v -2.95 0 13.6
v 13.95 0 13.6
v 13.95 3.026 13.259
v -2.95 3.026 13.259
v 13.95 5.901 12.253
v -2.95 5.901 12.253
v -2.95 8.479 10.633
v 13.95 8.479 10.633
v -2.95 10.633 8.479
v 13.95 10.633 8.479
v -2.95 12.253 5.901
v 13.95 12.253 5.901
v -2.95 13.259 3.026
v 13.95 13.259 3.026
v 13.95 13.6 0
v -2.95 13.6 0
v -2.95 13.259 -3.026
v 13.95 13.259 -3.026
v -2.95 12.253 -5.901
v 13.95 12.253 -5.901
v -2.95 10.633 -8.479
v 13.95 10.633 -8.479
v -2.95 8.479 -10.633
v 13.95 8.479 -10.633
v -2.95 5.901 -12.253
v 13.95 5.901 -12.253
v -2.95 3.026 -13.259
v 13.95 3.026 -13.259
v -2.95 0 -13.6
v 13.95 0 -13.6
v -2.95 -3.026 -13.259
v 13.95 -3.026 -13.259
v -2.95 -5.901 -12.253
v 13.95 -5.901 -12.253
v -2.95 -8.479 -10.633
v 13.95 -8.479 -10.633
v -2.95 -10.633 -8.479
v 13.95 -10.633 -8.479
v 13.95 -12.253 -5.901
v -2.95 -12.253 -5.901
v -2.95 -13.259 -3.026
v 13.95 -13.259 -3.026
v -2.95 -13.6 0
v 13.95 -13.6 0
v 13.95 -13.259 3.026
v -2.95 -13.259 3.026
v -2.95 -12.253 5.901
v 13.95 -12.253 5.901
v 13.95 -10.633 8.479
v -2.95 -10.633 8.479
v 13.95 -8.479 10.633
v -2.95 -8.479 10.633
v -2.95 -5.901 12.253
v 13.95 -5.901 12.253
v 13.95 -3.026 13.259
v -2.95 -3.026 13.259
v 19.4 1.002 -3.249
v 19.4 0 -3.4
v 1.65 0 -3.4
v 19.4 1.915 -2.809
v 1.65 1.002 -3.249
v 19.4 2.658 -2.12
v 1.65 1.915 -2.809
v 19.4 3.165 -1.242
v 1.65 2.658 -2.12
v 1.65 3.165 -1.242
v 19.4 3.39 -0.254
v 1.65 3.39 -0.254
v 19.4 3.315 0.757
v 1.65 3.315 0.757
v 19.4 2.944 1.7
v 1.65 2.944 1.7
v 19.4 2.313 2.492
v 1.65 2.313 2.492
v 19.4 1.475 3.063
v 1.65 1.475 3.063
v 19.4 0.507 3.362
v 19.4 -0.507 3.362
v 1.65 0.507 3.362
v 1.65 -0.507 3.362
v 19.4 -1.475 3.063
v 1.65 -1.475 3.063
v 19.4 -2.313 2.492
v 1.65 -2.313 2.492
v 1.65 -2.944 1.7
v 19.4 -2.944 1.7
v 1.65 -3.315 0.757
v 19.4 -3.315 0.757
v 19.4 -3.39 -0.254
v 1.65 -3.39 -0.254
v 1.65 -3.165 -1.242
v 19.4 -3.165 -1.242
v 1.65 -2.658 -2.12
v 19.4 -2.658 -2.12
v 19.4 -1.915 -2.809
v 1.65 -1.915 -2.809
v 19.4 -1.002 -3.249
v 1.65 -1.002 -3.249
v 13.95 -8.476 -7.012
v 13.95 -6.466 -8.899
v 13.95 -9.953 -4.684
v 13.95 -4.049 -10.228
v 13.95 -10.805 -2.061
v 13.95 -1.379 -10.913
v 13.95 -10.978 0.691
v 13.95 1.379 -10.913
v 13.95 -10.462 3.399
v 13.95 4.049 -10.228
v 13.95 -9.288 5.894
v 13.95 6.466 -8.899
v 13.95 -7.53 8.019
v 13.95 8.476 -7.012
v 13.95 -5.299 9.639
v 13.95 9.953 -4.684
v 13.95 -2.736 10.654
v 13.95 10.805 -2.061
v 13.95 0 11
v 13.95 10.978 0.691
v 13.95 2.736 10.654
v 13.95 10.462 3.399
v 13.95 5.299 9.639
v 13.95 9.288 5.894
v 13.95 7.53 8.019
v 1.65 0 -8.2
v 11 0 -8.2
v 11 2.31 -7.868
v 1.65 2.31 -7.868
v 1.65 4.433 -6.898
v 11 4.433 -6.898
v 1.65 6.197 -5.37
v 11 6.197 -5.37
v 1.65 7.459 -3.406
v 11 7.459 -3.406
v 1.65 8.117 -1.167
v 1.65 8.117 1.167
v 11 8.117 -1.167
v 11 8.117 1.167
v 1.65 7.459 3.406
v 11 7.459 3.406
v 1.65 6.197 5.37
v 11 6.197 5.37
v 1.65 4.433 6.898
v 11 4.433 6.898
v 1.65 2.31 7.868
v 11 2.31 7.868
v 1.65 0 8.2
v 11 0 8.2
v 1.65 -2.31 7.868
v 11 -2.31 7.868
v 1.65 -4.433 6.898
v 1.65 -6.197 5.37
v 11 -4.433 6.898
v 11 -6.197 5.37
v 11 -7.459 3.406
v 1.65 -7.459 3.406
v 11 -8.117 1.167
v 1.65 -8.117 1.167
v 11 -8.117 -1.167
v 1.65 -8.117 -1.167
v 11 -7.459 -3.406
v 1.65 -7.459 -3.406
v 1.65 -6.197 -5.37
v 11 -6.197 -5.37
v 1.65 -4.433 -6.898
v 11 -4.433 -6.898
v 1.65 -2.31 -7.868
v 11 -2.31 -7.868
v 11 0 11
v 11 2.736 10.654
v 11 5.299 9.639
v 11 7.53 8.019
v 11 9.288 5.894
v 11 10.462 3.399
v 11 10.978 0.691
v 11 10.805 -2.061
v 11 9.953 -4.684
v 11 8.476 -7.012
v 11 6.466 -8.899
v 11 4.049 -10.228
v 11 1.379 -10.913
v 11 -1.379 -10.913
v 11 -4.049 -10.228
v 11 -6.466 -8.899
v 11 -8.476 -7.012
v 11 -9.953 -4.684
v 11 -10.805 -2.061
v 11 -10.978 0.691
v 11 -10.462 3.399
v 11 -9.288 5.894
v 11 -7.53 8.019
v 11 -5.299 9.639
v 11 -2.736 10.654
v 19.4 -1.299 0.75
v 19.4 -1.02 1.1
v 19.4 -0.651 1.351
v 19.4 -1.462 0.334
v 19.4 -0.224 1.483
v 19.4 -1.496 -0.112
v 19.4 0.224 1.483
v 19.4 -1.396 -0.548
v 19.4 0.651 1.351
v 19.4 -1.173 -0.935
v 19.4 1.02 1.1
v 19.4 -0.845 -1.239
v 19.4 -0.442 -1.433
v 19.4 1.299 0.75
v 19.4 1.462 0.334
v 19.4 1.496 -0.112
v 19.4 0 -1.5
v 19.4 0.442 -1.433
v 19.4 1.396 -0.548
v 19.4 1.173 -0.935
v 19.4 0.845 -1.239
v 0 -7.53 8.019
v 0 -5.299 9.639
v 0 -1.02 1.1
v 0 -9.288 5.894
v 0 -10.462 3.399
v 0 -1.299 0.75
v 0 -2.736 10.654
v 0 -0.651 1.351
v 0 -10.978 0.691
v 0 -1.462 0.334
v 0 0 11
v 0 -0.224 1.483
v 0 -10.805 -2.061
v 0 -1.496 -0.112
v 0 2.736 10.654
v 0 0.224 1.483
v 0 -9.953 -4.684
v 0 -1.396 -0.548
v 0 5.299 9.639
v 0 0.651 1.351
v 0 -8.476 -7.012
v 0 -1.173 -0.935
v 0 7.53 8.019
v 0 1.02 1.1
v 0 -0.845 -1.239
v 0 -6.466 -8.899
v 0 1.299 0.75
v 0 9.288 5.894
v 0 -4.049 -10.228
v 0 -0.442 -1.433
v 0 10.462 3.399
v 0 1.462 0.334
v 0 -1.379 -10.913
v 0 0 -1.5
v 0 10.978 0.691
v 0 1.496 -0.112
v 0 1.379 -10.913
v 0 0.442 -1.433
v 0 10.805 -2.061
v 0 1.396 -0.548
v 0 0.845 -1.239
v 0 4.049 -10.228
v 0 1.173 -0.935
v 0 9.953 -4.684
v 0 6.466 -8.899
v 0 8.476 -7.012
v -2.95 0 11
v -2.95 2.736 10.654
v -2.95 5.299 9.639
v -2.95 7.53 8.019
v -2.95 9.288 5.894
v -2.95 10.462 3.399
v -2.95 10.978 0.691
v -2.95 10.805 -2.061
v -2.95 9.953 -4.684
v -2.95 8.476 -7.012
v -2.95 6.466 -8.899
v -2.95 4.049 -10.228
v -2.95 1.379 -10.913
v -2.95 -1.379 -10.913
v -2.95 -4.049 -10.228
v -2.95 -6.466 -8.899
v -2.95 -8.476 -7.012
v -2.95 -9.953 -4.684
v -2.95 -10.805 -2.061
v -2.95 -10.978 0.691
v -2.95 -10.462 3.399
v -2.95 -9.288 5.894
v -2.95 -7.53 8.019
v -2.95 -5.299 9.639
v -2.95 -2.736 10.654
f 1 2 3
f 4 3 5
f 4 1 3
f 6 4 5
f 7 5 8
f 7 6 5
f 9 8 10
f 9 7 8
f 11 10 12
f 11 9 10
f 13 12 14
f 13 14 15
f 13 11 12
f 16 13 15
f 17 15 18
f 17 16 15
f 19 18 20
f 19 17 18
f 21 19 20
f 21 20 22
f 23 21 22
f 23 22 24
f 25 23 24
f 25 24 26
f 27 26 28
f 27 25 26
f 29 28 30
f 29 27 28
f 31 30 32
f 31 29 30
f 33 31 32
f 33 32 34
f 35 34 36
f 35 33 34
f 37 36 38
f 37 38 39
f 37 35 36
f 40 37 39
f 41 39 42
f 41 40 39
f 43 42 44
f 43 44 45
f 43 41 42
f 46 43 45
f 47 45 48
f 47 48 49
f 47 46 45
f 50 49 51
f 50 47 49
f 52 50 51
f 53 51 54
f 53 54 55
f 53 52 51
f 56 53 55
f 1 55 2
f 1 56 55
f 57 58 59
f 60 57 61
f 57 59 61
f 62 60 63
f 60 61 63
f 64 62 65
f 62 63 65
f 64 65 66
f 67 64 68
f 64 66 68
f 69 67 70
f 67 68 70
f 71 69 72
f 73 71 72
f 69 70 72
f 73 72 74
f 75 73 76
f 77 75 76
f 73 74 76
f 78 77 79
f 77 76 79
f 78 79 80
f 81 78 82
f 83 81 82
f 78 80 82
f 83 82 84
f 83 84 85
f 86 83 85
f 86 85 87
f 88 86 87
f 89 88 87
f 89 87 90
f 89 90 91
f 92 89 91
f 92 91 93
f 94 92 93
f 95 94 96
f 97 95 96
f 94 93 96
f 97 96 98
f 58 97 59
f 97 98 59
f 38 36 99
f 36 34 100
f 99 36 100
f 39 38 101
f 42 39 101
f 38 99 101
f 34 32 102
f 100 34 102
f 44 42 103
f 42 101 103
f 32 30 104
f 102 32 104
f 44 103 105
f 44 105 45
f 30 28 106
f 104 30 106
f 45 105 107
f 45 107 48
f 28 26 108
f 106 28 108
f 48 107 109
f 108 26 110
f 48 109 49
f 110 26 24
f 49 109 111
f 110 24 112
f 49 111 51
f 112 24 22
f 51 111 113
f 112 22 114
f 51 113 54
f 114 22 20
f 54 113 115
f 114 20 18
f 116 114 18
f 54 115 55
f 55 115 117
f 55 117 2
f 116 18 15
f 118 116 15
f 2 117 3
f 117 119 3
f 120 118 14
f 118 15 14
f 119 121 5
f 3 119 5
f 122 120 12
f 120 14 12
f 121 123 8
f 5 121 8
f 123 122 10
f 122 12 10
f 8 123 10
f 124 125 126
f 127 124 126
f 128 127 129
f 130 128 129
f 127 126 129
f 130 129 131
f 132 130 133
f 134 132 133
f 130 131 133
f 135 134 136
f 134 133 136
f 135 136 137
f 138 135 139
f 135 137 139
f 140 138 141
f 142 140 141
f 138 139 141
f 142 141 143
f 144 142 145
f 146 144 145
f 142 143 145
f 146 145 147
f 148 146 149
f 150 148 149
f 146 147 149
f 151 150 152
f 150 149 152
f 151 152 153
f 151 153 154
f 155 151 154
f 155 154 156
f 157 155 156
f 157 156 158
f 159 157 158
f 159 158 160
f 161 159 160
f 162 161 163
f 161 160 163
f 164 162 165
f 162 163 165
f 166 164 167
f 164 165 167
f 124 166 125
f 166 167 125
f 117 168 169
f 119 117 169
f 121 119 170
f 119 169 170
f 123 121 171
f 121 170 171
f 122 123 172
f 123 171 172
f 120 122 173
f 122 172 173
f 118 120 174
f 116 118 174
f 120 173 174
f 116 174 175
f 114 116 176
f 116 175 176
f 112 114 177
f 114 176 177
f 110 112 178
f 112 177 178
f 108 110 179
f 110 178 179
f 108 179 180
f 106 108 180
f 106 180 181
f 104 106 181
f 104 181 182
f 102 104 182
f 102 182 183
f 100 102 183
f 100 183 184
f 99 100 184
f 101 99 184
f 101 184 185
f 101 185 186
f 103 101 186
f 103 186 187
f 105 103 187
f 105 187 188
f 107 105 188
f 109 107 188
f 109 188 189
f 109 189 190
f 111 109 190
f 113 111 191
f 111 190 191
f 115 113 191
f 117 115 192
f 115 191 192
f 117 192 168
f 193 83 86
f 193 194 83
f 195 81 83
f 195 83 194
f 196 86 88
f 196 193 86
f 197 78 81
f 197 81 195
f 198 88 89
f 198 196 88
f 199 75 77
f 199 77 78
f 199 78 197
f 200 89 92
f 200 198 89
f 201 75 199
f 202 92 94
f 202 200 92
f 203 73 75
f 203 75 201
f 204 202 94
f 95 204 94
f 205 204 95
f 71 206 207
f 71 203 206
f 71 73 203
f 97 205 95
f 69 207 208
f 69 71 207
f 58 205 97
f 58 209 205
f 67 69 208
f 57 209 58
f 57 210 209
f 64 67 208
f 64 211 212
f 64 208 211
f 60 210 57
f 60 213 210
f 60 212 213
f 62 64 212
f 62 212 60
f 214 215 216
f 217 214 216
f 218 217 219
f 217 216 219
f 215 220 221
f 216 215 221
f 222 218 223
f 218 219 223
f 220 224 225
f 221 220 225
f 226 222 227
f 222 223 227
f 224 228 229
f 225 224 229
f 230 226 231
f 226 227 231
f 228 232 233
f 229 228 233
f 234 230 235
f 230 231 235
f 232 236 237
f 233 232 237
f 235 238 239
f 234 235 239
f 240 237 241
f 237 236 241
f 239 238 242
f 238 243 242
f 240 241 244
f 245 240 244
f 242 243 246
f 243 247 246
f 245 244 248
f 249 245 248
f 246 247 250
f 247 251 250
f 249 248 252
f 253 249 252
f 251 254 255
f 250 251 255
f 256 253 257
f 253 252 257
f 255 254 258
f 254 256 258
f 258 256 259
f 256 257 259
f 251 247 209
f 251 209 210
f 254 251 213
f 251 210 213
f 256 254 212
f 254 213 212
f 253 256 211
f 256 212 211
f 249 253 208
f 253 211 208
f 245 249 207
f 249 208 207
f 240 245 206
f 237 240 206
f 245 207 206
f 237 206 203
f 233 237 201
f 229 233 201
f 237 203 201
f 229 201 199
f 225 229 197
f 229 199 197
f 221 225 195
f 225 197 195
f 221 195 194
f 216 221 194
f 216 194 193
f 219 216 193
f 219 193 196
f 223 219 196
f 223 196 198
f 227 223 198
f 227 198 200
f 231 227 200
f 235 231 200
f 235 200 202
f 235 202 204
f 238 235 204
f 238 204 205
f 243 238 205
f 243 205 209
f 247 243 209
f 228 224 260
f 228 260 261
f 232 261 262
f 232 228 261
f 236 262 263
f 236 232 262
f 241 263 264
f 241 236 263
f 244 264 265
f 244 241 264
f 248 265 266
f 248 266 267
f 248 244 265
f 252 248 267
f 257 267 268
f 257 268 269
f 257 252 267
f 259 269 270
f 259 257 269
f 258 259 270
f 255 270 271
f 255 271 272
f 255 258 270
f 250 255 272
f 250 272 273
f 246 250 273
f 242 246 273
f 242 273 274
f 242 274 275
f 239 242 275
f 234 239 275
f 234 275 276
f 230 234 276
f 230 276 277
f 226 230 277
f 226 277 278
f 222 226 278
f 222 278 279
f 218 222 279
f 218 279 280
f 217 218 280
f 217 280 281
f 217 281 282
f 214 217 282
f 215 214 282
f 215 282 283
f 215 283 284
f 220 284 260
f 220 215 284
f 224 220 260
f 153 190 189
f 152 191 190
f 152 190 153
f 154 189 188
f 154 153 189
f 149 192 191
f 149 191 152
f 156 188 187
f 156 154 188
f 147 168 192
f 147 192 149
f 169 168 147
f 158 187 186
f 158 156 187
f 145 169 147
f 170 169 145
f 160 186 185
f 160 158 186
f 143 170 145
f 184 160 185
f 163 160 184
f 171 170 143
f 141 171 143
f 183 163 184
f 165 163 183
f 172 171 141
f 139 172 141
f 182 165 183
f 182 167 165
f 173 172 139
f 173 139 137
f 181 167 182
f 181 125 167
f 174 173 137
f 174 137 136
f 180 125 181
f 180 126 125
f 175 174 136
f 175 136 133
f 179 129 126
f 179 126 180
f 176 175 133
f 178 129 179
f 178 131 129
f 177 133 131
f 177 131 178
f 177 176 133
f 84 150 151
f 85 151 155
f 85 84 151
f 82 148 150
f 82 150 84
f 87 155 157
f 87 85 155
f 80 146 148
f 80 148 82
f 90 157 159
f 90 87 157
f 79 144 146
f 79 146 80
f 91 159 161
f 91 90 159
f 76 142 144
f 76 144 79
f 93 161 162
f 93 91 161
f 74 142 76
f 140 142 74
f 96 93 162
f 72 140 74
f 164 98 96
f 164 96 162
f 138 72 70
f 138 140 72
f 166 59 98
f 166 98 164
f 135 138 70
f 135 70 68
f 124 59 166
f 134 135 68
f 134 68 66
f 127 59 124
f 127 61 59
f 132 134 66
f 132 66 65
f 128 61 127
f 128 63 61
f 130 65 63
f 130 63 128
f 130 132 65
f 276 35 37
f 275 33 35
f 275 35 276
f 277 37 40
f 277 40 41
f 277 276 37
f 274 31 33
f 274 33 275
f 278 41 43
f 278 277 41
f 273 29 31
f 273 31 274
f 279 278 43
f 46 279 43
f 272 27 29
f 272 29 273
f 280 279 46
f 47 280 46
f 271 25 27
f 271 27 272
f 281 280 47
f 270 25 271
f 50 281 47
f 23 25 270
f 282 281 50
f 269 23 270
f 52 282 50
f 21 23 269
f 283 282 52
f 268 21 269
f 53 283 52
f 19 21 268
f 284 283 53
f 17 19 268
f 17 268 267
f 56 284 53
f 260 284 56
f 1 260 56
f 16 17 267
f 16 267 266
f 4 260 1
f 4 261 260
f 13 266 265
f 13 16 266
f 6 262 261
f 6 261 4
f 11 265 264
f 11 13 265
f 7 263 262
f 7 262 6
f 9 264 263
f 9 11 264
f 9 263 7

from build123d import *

# Parameters (mm, degrees)
SKETCH_1_R           = 11
EXTRUDE_1_DEPTH      = 11
SKETCH_2_R           = 8.2
CUT_EXTRUDE_1_DEPTH  = 9.35
SKETCH_4_R           = 3.4
EXTRUDE_2_DEPTH      = 17.75
SKETCH_5_R           = 1.5
CUT_EXTRUDE_4_DEPTH  = 25.75
SKETCH_6_R           = 13.6
SKETCH_6_R_2         = 11
EXTRUDE_4_DEPTH      = 2.95
EXTRUDE_4_DEPTH_BACK = 13.95


with BuildPart() as part:
    # ｽｹｯﾁ1 → ﾎﾞｽ - 押し出し1 (new body)
    with BuildSketch(Plane(origin=(0, 0, 0), x_dir=(0, 0, -1), z_dir=(1, 0, 0))):
        Circle(SKETCH_1_R)
    extrude(amount=EXTRUDE_1_DEPTH)

    # ｽｹｯﾁ2 → ｶｯﾄ - 押し出し1 (cut)
    with BuildSketch(Plane(origin=(11, 0, 0), x_dir=(0, 0, -1), z_dir=(1, 0, 0))):
        Circle(SKETCH_2_R)
    extrude(amount=-CUT_EXTRUDE_1_DEPTH, mode=Mode.SUBTRACT)

    # ｽｹｯﾁ4 → ﾎﾞｽ - 押し出し2 (add)
    with BuildSketch(Plane(origin=(1.65, 0, 0), x_dir=(0, 0, -1), z_dir=(1, 0, 0))):
        Circle(SKETCH_4_R)
    extrude(amount=EXTRUDE_2_DEPTH)

    # ｽｹｯﾁ5 → ｶｯﾄ - 押し出し4 (cut)
    with BuildSketch(Plane(origin=(19.4, 0, 0), x_dir=(0, 0, -1), z_dir=(1, 0, 0))):
        Circle(SKETCH_5_R)
    extrude(amount=-CUT_EXTRUDE_4_DEPTH, mode=Mode.SUBTRACT)

    # ｽｹｯﾁ6 → ﾎﾞｽ - 押し出し4 (add, two sides)
    with BuildSketch(Plane.ZY) as extrude_4_sk:
        Circle(SKETCH_6_R)
        Circle(SKETCH_6_R_2, mode=Mode.SUBTRACT)
    extrude(amount=EXTRUDE_4_DEPTH)
    extrude(extrude_4_sk.sketch, amount=-EXTRUDE_4_DEPTH_BACK)


solid = part.part
